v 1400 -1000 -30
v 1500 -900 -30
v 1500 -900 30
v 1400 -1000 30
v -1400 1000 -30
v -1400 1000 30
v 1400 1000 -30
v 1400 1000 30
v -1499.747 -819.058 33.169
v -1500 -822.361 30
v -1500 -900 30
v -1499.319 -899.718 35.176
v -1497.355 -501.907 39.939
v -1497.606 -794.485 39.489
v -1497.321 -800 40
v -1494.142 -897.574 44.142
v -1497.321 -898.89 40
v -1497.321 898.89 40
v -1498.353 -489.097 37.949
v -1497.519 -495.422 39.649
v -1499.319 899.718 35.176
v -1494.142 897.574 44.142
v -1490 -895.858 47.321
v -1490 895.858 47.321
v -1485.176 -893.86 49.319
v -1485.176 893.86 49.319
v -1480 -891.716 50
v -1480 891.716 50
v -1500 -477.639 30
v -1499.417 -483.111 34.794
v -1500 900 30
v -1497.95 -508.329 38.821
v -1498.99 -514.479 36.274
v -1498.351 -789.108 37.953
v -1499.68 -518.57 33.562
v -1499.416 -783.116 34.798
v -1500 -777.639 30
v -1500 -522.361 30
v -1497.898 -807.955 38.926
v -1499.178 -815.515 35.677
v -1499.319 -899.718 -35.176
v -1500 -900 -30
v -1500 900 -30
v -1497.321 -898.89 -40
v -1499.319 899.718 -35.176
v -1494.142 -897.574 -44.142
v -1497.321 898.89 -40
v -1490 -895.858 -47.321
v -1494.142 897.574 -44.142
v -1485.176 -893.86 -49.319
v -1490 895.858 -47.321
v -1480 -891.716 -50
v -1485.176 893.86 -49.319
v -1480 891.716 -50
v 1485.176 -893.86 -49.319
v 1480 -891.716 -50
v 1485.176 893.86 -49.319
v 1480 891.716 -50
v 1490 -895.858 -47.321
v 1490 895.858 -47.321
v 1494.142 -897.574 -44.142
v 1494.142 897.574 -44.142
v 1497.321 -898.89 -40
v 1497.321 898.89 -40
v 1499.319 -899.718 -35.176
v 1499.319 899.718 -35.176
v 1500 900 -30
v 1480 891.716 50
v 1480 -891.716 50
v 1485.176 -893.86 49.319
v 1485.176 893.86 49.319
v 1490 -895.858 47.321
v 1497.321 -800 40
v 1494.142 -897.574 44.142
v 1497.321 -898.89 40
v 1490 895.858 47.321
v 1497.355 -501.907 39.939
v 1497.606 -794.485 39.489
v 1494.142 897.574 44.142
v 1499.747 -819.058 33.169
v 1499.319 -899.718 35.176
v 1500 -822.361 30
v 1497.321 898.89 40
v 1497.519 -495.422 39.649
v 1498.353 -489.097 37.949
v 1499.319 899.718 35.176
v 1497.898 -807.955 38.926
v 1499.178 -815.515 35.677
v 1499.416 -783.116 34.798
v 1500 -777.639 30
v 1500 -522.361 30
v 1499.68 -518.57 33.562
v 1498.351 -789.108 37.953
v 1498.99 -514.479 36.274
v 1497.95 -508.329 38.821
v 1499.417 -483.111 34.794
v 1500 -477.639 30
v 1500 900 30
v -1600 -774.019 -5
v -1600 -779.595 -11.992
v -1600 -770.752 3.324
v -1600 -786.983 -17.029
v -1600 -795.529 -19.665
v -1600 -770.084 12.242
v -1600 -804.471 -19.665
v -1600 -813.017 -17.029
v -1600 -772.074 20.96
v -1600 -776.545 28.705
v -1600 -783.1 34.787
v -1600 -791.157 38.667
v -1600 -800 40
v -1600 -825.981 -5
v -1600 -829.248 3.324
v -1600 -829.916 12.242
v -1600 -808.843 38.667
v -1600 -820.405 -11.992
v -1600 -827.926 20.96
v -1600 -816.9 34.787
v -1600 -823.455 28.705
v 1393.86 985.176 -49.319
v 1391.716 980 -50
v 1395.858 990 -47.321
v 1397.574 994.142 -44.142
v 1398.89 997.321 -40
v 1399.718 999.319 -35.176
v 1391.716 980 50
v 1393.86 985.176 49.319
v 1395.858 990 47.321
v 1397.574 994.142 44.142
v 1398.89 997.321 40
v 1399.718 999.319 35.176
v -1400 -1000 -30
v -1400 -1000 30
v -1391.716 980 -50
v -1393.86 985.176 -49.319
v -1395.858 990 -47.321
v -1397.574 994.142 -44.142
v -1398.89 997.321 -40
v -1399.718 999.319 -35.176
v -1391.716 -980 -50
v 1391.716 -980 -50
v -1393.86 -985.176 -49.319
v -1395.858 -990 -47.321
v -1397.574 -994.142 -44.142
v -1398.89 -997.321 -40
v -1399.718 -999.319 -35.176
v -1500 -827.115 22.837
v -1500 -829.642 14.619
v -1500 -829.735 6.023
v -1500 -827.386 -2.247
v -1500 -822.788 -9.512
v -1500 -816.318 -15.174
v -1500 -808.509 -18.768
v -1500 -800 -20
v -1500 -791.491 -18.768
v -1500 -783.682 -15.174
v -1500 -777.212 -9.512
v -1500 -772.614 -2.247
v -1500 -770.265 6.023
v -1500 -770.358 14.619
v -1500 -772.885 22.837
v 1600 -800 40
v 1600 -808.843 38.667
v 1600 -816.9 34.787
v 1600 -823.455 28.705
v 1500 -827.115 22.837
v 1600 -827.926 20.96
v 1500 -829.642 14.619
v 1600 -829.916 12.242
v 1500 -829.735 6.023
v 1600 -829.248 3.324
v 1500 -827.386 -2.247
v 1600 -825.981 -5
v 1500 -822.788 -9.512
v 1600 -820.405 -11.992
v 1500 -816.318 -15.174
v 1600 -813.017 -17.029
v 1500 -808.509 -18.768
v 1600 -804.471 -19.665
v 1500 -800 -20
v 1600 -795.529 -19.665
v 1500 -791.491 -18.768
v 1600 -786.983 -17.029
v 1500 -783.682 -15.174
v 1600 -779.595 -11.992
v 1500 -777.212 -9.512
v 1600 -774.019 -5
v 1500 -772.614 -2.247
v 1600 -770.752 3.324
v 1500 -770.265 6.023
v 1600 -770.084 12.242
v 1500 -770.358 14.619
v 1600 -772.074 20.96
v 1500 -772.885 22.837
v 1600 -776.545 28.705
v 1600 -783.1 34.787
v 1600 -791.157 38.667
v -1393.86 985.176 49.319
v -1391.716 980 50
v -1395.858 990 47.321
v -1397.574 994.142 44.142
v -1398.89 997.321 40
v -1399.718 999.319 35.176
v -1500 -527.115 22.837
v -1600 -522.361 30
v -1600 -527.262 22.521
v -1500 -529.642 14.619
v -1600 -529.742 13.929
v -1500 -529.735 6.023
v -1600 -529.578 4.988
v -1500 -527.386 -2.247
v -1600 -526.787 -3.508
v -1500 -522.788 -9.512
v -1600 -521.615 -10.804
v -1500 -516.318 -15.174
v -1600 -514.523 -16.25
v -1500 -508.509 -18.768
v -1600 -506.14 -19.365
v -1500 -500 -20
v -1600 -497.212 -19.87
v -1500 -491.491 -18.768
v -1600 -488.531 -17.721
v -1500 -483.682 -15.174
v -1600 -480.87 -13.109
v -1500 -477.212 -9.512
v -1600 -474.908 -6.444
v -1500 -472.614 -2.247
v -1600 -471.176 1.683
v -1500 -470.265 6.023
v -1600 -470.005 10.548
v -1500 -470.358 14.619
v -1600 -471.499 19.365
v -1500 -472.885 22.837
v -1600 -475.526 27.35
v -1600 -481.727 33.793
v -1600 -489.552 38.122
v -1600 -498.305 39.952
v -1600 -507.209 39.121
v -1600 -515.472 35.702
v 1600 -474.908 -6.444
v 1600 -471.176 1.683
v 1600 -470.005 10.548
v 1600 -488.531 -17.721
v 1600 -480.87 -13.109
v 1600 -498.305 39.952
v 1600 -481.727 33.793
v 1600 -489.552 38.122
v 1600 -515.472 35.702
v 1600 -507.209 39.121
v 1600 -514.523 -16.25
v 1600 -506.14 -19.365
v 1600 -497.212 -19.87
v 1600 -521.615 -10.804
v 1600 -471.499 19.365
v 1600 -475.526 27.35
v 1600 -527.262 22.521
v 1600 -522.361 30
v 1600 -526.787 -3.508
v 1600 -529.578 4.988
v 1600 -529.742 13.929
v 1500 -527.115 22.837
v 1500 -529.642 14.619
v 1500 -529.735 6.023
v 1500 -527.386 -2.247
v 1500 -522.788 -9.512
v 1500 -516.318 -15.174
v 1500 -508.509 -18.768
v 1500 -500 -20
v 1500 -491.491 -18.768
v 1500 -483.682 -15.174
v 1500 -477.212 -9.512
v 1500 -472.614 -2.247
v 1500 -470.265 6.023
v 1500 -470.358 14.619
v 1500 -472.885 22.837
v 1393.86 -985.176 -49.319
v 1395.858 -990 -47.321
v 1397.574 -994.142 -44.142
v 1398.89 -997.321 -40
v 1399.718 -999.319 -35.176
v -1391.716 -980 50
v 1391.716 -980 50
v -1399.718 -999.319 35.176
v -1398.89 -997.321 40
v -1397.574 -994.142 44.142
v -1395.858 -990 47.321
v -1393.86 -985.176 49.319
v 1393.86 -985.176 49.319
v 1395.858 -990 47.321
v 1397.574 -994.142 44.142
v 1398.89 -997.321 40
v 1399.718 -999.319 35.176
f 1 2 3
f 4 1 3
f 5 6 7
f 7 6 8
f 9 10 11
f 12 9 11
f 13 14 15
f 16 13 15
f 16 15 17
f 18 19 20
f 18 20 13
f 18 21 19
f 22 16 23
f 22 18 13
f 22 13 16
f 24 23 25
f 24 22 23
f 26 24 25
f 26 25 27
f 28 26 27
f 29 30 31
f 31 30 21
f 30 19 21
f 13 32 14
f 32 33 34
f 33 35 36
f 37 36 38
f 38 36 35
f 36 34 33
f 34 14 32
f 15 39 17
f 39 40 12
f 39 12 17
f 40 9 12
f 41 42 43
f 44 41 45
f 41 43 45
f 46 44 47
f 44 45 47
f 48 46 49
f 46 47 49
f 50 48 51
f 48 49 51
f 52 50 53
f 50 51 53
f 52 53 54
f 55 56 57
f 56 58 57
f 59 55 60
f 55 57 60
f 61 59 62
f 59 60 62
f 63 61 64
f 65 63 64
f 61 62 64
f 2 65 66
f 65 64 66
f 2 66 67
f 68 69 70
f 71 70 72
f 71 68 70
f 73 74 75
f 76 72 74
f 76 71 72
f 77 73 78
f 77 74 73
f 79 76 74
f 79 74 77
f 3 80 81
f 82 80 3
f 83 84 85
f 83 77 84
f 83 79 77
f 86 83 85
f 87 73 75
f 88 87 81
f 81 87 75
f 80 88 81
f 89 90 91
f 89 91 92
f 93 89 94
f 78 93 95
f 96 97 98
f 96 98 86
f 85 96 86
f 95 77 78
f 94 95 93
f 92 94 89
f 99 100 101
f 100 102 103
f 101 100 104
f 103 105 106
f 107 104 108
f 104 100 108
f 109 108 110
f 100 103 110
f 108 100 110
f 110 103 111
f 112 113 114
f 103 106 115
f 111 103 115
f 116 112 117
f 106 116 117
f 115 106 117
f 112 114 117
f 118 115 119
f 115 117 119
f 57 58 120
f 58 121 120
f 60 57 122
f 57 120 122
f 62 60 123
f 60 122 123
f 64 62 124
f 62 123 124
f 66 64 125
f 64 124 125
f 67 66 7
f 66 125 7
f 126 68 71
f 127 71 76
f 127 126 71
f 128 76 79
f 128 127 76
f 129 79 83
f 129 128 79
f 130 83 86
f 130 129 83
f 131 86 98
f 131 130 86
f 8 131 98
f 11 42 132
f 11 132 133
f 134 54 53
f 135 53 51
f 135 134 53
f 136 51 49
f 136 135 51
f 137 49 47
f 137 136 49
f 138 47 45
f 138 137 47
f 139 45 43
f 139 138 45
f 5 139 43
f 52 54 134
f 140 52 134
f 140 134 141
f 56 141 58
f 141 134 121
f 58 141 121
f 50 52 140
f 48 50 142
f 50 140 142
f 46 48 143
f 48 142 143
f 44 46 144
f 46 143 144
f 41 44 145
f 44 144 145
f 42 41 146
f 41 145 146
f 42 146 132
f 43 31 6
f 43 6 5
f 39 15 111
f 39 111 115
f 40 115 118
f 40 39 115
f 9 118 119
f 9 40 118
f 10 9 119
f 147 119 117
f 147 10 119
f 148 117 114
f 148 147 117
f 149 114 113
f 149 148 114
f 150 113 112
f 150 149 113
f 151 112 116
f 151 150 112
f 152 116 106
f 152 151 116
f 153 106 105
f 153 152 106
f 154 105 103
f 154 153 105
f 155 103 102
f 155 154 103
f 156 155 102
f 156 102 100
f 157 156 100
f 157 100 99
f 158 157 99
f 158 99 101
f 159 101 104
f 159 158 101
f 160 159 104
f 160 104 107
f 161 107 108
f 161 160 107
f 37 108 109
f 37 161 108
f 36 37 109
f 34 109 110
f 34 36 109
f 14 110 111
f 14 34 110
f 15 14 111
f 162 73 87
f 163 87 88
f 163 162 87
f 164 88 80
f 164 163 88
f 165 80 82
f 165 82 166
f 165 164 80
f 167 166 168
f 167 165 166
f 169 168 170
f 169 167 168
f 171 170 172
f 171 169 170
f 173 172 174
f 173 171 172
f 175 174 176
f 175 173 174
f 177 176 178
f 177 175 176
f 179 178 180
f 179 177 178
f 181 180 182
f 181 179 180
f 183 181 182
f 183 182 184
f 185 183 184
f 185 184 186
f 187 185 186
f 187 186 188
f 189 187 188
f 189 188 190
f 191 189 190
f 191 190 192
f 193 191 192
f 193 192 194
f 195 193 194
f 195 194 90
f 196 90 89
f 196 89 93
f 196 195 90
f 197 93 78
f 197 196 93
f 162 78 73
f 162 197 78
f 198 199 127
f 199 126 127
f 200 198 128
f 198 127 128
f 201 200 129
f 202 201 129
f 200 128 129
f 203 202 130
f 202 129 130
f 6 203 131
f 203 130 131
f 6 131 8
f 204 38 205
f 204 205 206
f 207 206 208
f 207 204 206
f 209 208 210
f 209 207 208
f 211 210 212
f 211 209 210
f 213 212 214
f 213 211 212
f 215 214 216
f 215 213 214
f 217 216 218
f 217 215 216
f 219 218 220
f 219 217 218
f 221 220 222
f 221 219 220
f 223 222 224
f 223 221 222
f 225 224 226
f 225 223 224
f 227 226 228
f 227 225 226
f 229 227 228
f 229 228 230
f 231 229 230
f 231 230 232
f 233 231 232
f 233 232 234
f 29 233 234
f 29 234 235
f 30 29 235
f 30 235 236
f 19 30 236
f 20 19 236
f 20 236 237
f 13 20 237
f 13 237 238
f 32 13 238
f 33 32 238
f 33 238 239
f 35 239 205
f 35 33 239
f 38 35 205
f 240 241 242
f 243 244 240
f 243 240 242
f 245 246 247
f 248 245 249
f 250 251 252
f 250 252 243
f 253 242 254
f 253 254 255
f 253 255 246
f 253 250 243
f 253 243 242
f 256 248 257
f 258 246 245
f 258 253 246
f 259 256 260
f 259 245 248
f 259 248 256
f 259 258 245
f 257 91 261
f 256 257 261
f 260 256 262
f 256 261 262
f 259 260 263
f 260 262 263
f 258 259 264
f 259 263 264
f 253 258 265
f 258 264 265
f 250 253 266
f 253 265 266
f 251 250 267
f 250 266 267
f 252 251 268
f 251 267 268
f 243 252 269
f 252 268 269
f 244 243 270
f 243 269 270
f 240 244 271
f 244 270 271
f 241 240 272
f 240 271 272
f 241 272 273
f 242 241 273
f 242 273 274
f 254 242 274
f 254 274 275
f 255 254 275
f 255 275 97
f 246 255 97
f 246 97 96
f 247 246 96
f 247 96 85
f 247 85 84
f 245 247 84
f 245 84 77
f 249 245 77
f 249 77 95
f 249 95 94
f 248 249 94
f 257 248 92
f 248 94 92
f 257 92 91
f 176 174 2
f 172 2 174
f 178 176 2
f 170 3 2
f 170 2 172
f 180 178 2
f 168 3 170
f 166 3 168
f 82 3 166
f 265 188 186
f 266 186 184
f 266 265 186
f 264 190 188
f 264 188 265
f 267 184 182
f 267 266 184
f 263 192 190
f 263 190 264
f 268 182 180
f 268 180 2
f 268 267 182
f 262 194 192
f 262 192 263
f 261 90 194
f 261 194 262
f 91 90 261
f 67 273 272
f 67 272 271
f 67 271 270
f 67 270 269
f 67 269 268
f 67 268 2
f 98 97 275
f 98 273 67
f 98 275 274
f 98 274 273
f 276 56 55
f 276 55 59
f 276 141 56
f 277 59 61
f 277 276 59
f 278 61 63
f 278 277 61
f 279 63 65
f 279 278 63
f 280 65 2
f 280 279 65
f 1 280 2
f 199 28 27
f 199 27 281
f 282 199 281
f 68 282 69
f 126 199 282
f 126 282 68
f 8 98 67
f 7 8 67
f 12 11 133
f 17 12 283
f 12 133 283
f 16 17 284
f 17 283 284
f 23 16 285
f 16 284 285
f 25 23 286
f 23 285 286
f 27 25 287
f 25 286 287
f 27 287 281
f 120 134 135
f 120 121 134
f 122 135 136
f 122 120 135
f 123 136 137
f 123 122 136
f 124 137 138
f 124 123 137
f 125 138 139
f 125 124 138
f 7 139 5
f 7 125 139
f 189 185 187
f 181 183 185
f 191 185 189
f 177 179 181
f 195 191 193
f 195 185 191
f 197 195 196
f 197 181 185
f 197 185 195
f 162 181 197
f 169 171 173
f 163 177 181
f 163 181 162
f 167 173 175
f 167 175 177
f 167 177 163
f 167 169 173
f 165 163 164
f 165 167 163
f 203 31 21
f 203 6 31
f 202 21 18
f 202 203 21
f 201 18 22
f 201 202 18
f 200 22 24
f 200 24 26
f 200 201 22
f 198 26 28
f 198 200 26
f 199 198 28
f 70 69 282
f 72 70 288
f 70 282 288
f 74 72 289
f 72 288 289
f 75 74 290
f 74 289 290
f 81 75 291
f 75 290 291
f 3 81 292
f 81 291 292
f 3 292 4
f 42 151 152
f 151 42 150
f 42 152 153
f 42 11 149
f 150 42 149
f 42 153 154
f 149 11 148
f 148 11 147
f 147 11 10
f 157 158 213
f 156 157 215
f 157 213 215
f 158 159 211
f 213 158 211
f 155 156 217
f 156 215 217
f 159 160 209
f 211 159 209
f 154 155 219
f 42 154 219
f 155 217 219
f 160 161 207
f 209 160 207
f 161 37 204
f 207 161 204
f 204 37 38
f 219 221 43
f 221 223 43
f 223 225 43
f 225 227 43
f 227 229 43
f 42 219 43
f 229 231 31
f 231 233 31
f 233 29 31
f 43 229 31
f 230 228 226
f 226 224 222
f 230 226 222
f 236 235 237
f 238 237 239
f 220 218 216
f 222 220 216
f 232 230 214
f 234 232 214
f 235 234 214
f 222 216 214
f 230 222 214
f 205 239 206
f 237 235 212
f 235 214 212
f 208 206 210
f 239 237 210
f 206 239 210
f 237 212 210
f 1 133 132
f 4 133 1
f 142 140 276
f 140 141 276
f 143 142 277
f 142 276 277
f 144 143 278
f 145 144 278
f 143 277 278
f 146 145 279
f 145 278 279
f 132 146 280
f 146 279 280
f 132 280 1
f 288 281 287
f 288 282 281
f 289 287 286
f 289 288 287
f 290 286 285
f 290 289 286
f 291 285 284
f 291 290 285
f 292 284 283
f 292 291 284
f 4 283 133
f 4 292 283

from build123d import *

# Parameters (mm, degrees)
SKETCH1_W           = 3000
SKETCH1_H           = 2000
BOSS_EXTRUDE1_DEPTH = 50
CHAMFER1_SIZE       = 100
FILLET1_R           = 20
SKETCH3_R           = 30
BOSS_EXTRUDE2_DEPTH = 1600


with BuildPart() as part:
    # Sketch1 → Boss-Extrude1 (new, symmetric)
    with BuildSketch(Plane.XY):
        Rectangle(SKETCH1_W, SKETCH1_H)
    extrude(amount=BOSS_EXTRUDE1_DEPTH, both=True)

    # Chamfer1
    chamfer1_edges = [part.edges().sort_by_distance(p)[0] for p in [
        (-1500, 1000, 0),
        (1500, 1000, 0),
        (1500, -1000, 0),
        (-1500, -1000, 0),
    ]]
    chamfer(chamfer1_edges, length=CHAMFER1_SIZE)

    # Fillet1
    fillet1_edges = [part.edges().sort_by_distance(p)[0] for p in [
        (0, -1000, -50),
        (0, -1000, 50),
        (-1500, 0, -50),
        (0, 1000, -50),
        (1500, 0, -50),
        (-1450, 950, -50),
        (1450, 950, -50),
        (1450, -950, -50),
        (-1450, -950, -50),
        (-1500, 0, 50),
        (1500, 0, 50),
        (0, 1000, 50),
        (-1450, 950, 50),
        (1450, 950, 50),
        (1450, -950, 50),
        (-1450, -950, 50),
    ]]
    fillet(fillet1_edges, radius=FILLET1_R)

    # Sketch3 → Boss-Extrude2 (add, symmetric)
    with BuildSketch(Plane(origin=(0, 0, 0), x_dir=(0, 0, -1), z_dir=(1, 0, 0))):
        with Locations(Location((-10, -500, 0), (0, 0, 228.189685104))):
            Circle(SKETCH3_R)
        with Locations(Location((-10, -800, 0), (0, 0, 180))):
            Circle(SKETCH3_R)
    extrude(amount=BOSS_EXTRUDE2_DEPTH, both=True)


solid = part.part
